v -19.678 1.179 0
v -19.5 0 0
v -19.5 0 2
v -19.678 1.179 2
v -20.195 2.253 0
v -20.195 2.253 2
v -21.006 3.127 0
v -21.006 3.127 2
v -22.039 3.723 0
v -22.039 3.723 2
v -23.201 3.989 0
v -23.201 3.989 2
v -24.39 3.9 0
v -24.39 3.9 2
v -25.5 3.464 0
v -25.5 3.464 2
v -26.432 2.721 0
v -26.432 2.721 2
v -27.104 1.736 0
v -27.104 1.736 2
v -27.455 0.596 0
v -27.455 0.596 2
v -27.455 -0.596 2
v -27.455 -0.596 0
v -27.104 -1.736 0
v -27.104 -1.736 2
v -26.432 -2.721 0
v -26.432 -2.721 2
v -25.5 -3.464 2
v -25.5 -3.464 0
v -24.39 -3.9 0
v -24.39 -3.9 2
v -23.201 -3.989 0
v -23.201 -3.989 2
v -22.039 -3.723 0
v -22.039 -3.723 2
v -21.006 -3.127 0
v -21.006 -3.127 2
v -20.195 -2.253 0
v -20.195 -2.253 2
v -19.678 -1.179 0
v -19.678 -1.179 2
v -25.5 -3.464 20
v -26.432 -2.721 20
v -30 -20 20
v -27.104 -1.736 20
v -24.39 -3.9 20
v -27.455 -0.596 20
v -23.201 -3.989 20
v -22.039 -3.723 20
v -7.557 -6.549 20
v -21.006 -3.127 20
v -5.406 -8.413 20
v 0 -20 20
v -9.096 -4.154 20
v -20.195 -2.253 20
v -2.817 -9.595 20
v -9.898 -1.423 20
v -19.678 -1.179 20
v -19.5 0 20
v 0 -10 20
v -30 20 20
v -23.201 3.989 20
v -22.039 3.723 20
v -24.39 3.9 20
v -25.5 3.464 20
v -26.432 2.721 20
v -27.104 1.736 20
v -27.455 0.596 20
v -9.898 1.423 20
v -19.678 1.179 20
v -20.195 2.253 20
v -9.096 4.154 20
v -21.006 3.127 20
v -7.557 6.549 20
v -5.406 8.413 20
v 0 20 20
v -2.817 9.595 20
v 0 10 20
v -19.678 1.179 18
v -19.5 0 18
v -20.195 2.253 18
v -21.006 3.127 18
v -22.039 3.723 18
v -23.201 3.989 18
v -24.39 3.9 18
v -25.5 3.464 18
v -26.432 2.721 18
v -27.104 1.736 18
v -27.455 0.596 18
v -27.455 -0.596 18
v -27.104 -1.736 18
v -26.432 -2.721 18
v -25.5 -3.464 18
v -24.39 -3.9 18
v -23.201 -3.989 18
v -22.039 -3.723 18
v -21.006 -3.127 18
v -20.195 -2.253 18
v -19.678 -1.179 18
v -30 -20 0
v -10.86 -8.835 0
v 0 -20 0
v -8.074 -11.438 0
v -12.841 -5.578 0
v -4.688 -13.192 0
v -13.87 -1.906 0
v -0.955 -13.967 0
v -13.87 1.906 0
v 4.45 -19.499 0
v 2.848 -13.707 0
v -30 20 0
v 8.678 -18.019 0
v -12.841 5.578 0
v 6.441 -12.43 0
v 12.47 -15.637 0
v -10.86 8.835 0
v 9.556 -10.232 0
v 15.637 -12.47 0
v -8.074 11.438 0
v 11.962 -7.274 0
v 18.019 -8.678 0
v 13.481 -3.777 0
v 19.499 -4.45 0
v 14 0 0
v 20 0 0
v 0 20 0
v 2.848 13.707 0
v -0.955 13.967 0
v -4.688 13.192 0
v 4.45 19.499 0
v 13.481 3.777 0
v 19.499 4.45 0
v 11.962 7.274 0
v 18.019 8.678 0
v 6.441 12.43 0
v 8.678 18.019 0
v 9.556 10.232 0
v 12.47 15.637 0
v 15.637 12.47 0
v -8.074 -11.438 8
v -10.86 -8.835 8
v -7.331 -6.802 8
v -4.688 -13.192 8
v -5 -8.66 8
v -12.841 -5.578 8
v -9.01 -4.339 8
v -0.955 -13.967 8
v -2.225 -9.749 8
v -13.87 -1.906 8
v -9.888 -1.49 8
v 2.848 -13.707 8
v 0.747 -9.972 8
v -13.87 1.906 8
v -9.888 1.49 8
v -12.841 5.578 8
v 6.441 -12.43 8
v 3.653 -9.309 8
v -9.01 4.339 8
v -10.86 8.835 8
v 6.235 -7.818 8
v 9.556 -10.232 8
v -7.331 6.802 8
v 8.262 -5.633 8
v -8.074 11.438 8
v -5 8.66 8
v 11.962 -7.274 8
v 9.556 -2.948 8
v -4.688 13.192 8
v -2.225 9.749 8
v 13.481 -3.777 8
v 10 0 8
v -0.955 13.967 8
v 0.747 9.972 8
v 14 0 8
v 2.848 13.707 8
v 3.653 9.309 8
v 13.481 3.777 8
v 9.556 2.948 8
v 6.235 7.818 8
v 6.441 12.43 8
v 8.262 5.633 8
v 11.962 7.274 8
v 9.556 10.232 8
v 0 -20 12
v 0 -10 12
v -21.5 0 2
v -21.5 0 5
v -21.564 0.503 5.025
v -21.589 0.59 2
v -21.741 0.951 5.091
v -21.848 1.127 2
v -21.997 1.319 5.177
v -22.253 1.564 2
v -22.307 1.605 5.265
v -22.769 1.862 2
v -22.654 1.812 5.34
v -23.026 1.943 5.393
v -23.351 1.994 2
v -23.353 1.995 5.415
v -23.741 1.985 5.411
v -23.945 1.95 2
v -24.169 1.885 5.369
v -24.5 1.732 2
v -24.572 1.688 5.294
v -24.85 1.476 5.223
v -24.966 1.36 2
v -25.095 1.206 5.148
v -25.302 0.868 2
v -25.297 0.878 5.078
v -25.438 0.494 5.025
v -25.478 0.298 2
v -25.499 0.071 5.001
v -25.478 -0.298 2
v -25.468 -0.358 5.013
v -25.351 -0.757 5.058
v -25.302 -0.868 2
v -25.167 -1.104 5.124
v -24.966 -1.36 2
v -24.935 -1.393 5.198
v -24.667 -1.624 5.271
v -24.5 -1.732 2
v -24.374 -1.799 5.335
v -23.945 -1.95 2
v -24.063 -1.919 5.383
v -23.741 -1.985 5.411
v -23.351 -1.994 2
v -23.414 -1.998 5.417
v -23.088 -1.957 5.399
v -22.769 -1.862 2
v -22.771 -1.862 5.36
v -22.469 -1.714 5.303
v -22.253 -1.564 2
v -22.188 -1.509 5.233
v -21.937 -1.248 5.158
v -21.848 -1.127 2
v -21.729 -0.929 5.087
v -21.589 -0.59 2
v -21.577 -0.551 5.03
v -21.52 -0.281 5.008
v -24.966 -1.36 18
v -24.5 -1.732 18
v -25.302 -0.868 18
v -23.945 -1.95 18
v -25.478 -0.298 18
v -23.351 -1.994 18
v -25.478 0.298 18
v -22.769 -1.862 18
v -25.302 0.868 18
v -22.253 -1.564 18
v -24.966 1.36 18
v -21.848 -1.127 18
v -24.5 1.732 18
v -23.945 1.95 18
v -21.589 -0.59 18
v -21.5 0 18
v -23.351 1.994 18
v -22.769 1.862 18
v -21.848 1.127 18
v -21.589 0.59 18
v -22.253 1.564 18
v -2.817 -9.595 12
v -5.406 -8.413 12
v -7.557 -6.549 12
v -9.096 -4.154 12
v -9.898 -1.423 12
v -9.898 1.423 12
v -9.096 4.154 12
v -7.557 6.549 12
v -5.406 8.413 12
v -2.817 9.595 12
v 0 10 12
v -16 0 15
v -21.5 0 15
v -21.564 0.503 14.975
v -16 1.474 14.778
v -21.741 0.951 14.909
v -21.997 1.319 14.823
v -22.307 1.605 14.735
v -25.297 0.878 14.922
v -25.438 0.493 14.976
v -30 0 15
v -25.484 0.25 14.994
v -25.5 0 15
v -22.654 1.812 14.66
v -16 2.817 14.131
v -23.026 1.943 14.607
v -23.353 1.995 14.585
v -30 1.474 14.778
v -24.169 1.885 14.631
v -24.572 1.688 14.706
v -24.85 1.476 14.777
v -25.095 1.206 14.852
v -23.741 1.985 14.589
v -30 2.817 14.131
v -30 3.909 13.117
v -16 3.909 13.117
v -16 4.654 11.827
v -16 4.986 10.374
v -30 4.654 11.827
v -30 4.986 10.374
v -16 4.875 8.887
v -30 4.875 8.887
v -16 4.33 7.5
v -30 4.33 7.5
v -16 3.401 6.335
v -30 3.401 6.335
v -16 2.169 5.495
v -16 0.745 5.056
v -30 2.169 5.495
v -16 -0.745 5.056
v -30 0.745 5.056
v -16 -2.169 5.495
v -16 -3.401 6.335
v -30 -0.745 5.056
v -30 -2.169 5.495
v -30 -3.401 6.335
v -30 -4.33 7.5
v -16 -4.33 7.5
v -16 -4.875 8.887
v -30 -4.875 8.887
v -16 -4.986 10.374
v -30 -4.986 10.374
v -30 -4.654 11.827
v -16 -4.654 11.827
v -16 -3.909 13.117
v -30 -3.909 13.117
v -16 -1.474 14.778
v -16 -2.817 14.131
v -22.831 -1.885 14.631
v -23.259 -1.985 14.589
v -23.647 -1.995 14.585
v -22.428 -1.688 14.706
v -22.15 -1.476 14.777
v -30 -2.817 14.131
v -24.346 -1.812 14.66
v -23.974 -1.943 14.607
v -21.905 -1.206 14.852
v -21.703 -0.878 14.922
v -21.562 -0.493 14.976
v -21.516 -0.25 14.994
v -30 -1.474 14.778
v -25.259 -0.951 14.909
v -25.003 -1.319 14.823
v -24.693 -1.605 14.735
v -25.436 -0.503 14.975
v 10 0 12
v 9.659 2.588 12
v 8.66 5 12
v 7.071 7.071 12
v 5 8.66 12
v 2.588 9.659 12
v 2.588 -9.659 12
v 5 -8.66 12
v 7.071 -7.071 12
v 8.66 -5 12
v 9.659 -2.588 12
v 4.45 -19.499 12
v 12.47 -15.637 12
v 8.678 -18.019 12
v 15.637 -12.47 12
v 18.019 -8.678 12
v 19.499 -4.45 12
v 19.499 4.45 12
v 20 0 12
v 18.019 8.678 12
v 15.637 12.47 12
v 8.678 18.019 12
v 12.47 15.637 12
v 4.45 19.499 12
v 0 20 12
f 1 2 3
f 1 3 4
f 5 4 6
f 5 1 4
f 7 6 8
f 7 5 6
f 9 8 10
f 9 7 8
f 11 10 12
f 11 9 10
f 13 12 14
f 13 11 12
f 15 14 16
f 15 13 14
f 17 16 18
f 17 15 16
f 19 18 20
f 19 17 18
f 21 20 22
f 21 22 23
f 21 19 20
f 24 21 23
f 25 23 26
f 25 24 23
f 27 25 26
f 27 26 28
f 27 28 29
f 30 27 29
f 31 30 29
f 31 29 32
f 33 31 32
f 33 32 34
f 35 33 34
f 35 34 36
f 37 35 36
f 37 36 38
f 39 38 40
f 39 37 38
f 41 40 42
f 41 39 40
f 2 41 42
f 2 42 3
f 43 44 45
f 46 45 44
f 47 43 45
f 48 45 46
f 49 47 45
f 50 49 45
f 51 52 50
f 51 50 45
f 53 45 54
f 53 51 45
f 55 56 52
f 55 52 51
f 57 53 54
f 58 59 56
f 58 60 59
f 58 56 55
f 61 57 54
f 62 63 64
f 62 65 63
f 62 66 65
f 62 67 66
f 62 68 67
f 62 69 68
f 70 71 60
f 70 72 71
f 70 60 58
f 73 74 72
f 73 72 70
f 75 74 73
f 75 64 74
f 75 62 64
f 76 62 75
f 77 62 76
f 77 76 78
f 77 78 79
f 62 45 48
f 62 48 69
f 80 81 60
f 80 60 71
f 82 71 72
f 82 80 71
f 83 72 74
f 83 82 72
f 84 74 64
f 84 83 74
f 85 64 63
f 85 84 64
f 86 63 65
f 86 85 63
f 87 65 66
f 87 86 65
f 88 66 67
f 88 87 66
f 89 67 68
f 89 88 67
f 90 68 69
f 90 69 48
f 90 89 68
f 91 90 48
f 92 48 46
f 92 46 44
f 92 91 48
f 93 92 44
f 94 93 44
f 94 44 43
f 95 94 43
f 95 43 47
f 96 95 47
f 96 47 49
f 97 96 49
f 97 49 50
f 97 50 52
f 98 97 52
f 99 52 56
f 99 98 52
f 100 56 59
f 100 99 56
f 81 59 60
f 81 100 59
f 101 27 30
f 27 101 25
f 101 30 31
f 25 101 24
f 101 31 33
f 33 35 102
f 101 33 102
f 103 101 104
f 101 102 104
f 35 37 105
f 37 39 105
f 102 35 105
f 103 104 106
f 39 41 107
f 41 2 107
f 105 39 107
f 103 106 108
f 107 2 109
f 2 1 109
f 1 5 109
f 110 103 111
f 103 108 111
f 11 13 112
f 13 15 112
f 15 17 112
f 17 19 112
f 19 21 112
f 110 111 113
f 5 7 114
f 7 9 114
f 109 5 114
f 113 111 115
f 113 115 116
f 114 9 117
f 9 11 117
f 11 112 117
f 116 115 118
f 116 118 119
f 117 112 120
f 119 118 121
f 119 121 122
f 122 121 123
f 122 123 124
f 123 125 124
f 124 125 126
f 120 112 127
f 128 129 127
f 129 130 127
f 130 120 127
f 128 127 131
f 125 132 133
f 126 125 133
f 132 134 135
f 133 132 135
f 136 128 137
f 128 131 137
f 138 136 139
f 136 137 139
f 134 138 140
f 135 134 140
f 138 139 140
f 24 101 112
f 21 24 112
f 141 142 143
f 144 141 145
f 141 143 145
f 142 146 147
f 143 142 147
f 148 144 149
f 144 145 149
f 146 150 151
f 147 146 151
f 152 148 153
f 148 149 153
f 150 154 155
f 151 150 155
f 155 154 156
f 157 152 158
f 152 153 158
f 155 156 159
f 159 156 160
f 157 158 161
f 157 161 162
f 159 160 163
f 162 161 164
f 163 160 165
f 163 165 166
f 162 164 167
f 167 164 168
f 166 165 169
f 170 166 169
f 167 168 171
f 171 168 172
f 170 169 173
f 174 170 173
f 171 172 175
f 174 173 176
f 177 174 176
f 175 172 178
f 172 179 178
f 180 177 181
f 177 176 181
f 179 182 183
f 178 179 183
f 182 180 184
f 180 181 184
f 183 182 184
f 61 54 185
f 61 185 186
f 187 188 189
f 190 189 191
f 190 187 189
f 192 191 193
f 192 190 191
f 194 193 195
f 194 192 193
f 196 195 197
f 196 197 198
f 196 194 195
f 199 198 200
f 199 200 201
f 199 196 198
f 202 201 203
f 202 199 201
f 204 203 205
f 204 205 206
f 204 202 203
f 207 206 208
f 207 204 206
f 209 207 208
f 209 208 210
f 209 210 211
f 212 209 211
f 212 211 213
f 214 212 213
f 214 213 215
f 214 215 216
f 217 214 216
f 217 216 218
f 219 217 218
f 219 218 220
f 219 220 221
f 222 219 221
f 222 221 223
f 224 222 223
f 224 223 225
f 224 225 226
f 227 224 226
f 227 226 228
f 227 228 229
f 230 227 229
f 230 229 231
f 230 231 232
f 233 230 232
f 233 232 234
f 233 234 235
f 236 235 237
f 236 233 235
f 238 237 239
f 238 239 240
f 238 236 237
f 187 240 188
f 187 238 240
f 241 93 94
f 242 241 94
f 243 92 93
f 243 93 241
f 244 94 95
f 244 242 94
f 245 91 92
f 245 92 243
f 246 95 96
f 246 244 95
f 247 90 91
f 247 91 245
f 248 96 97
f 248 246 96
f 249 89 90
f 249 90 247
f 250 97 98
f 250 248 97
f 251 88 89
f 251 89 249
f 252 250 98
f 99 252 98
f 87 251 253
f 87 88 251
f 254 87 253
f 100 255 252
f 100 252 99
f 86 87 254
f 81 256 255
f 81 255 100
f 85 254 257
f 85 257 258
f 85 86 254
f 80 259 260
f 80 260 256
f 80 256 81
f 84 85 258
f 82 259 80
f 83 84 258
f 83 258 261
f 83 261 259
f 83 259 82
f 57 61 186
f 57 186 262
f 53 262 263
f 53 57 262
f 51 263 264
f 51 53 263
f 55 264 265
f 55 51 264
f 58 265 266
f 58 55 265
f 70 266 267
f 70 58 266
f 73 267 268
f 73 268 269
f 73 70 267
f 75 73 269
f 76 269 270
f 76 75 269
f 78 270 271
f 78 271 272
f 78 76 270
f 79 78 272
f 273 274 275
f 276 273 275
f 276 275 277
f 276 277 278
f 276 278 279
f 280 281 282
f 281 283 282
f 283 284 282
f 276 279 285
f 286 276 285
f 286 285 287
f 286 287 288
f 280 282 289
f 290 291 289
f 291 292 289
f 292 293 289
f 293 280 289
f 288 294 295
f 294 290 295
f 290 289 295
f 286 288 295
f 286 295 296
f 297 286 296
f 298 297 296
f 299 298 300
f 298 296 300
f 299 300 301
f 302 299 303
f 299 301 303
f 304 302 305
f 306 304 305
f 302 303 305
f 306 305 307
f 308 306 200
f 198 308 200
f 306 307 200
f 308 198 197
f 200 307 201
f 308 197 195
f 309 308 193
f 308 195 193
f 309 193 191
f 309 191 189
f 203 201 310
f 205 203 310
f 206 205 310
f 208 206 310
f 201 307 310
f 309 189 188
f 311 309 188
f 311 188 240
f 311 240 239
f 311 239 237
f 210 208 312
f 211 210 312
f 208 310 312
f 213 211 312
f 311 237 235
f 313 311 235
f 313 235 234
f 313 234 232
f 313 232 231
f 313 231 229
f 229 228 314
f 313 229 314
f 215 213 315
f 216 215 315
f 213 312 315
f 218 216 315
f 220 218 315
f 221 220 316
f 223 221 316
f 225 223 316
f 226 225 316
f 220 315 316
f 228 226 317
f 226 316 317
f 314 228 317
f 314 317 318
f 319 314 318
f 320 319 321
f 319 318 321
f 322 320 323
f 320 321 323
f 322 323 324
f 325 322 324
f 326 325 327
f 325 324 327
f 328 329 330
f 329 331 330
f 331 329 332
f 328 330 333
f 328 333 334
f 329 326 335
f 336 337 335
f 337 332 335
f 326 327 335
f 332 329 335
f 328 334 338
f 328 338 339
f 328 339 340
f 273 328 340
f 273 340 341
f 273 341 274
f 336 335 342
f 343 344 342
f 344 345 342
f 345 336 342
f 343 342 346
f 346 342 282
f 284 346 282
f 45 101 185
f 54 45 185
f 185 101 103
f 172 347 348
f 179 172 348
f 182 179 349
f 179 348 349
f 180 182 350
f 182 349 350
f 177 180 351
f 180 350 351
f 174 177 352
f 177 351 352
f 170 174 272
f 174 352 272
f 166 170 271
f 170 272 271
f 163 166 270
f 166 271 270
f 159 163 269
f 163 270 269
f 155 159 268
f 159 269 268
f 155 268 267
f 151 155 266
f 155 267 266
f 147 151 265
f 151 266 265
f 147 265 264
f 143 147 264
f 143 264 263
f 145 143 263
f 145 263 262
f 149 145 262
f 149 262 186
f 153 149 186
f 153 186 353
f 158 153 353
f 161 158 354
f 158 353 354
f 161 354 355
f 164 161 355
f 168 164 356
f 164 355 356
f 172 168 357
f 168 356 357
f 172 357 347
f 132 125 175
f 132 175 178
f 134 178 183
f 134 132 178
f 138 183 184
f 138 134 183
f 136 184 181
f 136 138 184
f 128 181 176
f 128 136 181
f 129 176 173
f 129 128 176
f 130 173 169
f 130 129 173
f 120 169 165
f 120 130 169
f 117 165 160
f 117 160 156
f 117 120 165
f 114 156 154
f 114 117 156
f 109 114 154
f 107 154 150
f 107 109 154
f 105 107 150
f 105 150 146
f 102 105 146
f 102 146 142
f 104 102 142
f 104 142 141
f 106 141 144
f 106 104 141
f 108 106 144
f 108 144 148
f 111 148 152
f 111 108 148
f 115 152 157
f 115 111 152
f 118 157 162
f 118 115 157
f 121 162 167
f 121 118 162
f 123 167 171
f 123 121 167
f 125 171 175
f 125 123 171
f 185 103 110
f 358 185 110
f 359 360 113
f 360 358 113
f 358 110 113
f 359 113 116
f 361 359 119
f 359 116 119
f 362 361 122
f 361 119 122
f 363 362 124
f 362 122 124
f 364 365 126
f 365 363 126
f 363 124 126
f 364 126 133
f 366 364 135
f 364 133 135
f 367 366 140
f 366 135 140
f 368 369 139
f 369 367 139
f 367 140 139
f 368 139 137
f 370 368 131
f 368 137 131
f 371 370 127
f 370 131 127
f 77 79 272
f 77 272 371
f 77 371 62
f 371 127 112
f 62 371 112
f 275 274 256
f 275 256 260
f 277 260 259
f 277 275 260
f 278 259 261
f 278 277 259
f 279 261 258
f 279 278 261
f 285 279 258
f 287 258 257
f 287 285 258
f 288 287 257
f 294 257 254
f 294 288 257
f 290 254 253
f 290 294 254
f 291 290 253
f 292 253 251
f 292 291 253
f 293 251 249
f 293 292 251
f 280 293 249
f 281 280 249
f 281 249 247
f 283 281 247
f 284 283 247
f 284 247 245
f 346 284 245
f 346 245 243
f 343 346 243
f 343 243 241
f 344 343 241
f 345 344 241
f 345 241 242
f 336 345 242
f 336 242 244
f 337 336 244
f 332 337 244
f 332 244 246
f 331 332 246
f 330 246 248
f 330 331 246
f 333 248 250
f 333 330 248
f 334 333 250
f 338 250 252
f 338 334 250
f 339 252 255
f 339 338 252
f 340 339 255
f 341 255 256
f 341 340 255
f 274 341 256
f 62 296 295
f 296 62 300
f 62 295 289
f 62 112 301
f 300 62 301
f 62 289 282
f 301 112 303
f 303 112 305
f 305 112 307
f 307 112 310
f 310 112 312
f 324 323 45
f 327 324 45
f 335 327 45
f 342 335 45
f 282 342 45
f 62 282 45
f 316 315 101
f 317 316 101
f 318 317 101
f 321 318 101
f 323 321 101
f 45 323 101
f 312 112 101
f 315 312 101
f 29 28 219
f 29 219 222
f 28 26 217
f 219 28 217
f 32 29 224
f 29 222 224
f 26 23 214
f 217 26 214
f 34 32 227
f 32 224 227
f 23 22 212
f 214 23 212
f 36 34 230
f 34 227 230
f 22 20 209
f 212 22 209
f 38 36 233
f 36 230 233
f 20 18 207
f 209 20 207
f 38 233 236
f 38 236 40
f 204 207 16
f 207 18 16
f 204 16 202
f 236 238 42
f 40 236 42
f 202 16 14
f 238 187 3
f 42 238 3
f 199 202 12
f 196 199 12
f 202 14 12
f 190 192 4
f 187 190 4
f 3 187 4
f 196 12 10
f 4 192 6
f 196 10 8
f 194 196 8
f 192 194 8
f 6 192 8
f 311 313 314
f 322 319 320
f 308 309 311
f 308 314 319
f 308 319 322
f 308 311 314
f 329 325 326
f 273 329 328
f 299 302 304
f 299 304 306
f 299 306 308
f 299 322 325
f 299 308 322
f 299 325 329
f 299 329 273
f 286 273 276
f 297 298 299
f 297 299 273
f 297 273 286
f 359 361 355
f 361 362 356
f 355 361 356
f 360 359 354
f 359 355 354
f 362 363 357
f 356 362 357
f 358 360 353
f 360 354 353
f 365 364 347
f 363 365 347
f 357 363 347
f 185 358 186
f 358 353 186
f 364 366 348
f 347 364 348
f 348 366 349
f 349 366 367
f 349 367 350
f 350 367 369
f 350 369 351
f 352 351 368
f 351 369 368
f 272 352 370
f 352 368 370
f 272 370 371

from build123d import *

# Parameters (mm, degrees)
BOSS_EXTRU_1_DEPTH           = 20
ESQUISSE1_4_R                = 14
ENL_V_MAT_EXTRU_1_DEPTH      = 8
ESQUISSE3_R                  = 5
ENL_V_MAT_EXTRU_2_DEPTH      = 14
ENL_V_MAT_EXTRU_3_DEPTH      = 42.231056256
ENL_V_MAT_EXTRU_3_DEPTH_BACK = 42.231056256
ESQUISSE1_5_R                = 2
ESQUISSE1_6_R                = 4
ENL_V_MAT_EXTRU_4_DEPTH      = 2
ENL_V_START                  = 18
ESQUISSE1_7_R                = 4
ENL_V_MAT_EXTRU_5_DEPTH      = 2
ENL_V_MAT_EXTRU_6_REACH      = 43.231
ESQUISSE4_R                  = 10
ENL_V_MAT_EXTRU_7_DEPTH      = 8


with BuildPart() as part:
    # Esquisse1 → Boss.-Extru.1 (new body)
    with BuildSketch(Plane.XY):
        with BuildLine():
            Line((0, 20), (-30, 20))
            Line((-30, 20), (-30, -20))
            Line((-30, -20), (0, -20))
            ThreePointArc((0, -20), (20, 0), (0, 20))
        make_face()
    extrude(amount=BOSS_EXTRU_1_DEPTH)

    # Esquisse1<4> → Enlèv. mat.-Extru.1 (cut)
    with BuildSketch(Plane.XY):
        Circle(ESQUISSE1_4_R)
    extrude(amount=ENL_V_MAT_EXTRU_1_DEPTH, mode=Mode.SUBTRACT)

    # Esquisse3 → Enlèv. mat.-Extru.2 (cut)
    with BuildSketch(Plane.ZY.offset(30)):
        with Locations((10, 0)):
            Circle(ESQUISSE3_R)
    extrude(amount=-ENL_V_MAT_EXTRU_2_DEPTH, mode=Mode.SUBTRACT)

    # Esquisse1<5> → Enlèv. mat.-Extru.3 (cut, two sides: drawn at the far end of the back side and taken through both)
    with BuildSketch(Plane.XY.offset(-ENL_V_MAT_EXTRU_3_DEPTH_BACK)):
        with Locations((-23.5, 0)):
            Circle(ESQUISSE1_5_R)
    extrude(amount=ENL_V_MAT_EXTRU_3_DEPTH + ENL_V_MAT_EXTRU_3_DEPTH_BACK, mode=Mode.SUBTRACT)

    # Esquisse1<6> → Enlèv. mat.-Extru.4 (cut)
    with BuildSketch(Plane.XY):
        with Locations((-23.5, 0)):
            Circle(ESQUISSE1_6_R)
    extrude(amount=ENL_V_MAT_EXTRU_4_DEPTH, mode=Mode.SUBTRACT)

    # Esquisse1<7> → Enlèv. mat.-Extru.5 (cut)
    with BuildSketch(Plane.XY.offset(ENL_V_START)):
        with Locations((-23.5, 0)):
            Circle(ESQUISSE1_7_R)
    extrude(amount=ENL_V_MAT_EXTRU_5_DEPTH, mode=Mode.SUBTRACT)

    # Esquisse4 → Enlèv. mat.-Extru.6 (cut, up to next)
    with BuildSketch(Plane.XY.offset(20), mode=Mode.PRIVATE) as enl_v_mat_extru_6_sk1:
        Circle(ESQUISSE4_R)
    enl_v_mat_extru_6_tool1 = extrude(enl_v_mat_extru_6_sk1.sketch, amount=-ENL_V_MAT_EXTRU_6_REACH, mode=Mode.PRIVATE) & part.part
    add(enl_v_mat_extru_6_tool1.solids().sort_by_distance((0, 0, 20))[0], mode=Mode.SUBTRACT)

    # Esquisse5 → Enlèv. mat.-Extru.7 (cut)
    with BuildSketch(Plane.XY.offset(20)):
        with BuildLine():
            Line((0, 10), (0, 20))
            ThreePointArc((0, 20), (20, 0), (0, -20))
            Line((0, -20), (0, -10))
            ThreePointArc((0, -10), (-10, 0), (0, 10))
        make_face()
    extrude(amount=-ENL_V_MAT_EXTRU_7_DEPTH, mode=Mode.SUBTRACT)


solid = part.part
